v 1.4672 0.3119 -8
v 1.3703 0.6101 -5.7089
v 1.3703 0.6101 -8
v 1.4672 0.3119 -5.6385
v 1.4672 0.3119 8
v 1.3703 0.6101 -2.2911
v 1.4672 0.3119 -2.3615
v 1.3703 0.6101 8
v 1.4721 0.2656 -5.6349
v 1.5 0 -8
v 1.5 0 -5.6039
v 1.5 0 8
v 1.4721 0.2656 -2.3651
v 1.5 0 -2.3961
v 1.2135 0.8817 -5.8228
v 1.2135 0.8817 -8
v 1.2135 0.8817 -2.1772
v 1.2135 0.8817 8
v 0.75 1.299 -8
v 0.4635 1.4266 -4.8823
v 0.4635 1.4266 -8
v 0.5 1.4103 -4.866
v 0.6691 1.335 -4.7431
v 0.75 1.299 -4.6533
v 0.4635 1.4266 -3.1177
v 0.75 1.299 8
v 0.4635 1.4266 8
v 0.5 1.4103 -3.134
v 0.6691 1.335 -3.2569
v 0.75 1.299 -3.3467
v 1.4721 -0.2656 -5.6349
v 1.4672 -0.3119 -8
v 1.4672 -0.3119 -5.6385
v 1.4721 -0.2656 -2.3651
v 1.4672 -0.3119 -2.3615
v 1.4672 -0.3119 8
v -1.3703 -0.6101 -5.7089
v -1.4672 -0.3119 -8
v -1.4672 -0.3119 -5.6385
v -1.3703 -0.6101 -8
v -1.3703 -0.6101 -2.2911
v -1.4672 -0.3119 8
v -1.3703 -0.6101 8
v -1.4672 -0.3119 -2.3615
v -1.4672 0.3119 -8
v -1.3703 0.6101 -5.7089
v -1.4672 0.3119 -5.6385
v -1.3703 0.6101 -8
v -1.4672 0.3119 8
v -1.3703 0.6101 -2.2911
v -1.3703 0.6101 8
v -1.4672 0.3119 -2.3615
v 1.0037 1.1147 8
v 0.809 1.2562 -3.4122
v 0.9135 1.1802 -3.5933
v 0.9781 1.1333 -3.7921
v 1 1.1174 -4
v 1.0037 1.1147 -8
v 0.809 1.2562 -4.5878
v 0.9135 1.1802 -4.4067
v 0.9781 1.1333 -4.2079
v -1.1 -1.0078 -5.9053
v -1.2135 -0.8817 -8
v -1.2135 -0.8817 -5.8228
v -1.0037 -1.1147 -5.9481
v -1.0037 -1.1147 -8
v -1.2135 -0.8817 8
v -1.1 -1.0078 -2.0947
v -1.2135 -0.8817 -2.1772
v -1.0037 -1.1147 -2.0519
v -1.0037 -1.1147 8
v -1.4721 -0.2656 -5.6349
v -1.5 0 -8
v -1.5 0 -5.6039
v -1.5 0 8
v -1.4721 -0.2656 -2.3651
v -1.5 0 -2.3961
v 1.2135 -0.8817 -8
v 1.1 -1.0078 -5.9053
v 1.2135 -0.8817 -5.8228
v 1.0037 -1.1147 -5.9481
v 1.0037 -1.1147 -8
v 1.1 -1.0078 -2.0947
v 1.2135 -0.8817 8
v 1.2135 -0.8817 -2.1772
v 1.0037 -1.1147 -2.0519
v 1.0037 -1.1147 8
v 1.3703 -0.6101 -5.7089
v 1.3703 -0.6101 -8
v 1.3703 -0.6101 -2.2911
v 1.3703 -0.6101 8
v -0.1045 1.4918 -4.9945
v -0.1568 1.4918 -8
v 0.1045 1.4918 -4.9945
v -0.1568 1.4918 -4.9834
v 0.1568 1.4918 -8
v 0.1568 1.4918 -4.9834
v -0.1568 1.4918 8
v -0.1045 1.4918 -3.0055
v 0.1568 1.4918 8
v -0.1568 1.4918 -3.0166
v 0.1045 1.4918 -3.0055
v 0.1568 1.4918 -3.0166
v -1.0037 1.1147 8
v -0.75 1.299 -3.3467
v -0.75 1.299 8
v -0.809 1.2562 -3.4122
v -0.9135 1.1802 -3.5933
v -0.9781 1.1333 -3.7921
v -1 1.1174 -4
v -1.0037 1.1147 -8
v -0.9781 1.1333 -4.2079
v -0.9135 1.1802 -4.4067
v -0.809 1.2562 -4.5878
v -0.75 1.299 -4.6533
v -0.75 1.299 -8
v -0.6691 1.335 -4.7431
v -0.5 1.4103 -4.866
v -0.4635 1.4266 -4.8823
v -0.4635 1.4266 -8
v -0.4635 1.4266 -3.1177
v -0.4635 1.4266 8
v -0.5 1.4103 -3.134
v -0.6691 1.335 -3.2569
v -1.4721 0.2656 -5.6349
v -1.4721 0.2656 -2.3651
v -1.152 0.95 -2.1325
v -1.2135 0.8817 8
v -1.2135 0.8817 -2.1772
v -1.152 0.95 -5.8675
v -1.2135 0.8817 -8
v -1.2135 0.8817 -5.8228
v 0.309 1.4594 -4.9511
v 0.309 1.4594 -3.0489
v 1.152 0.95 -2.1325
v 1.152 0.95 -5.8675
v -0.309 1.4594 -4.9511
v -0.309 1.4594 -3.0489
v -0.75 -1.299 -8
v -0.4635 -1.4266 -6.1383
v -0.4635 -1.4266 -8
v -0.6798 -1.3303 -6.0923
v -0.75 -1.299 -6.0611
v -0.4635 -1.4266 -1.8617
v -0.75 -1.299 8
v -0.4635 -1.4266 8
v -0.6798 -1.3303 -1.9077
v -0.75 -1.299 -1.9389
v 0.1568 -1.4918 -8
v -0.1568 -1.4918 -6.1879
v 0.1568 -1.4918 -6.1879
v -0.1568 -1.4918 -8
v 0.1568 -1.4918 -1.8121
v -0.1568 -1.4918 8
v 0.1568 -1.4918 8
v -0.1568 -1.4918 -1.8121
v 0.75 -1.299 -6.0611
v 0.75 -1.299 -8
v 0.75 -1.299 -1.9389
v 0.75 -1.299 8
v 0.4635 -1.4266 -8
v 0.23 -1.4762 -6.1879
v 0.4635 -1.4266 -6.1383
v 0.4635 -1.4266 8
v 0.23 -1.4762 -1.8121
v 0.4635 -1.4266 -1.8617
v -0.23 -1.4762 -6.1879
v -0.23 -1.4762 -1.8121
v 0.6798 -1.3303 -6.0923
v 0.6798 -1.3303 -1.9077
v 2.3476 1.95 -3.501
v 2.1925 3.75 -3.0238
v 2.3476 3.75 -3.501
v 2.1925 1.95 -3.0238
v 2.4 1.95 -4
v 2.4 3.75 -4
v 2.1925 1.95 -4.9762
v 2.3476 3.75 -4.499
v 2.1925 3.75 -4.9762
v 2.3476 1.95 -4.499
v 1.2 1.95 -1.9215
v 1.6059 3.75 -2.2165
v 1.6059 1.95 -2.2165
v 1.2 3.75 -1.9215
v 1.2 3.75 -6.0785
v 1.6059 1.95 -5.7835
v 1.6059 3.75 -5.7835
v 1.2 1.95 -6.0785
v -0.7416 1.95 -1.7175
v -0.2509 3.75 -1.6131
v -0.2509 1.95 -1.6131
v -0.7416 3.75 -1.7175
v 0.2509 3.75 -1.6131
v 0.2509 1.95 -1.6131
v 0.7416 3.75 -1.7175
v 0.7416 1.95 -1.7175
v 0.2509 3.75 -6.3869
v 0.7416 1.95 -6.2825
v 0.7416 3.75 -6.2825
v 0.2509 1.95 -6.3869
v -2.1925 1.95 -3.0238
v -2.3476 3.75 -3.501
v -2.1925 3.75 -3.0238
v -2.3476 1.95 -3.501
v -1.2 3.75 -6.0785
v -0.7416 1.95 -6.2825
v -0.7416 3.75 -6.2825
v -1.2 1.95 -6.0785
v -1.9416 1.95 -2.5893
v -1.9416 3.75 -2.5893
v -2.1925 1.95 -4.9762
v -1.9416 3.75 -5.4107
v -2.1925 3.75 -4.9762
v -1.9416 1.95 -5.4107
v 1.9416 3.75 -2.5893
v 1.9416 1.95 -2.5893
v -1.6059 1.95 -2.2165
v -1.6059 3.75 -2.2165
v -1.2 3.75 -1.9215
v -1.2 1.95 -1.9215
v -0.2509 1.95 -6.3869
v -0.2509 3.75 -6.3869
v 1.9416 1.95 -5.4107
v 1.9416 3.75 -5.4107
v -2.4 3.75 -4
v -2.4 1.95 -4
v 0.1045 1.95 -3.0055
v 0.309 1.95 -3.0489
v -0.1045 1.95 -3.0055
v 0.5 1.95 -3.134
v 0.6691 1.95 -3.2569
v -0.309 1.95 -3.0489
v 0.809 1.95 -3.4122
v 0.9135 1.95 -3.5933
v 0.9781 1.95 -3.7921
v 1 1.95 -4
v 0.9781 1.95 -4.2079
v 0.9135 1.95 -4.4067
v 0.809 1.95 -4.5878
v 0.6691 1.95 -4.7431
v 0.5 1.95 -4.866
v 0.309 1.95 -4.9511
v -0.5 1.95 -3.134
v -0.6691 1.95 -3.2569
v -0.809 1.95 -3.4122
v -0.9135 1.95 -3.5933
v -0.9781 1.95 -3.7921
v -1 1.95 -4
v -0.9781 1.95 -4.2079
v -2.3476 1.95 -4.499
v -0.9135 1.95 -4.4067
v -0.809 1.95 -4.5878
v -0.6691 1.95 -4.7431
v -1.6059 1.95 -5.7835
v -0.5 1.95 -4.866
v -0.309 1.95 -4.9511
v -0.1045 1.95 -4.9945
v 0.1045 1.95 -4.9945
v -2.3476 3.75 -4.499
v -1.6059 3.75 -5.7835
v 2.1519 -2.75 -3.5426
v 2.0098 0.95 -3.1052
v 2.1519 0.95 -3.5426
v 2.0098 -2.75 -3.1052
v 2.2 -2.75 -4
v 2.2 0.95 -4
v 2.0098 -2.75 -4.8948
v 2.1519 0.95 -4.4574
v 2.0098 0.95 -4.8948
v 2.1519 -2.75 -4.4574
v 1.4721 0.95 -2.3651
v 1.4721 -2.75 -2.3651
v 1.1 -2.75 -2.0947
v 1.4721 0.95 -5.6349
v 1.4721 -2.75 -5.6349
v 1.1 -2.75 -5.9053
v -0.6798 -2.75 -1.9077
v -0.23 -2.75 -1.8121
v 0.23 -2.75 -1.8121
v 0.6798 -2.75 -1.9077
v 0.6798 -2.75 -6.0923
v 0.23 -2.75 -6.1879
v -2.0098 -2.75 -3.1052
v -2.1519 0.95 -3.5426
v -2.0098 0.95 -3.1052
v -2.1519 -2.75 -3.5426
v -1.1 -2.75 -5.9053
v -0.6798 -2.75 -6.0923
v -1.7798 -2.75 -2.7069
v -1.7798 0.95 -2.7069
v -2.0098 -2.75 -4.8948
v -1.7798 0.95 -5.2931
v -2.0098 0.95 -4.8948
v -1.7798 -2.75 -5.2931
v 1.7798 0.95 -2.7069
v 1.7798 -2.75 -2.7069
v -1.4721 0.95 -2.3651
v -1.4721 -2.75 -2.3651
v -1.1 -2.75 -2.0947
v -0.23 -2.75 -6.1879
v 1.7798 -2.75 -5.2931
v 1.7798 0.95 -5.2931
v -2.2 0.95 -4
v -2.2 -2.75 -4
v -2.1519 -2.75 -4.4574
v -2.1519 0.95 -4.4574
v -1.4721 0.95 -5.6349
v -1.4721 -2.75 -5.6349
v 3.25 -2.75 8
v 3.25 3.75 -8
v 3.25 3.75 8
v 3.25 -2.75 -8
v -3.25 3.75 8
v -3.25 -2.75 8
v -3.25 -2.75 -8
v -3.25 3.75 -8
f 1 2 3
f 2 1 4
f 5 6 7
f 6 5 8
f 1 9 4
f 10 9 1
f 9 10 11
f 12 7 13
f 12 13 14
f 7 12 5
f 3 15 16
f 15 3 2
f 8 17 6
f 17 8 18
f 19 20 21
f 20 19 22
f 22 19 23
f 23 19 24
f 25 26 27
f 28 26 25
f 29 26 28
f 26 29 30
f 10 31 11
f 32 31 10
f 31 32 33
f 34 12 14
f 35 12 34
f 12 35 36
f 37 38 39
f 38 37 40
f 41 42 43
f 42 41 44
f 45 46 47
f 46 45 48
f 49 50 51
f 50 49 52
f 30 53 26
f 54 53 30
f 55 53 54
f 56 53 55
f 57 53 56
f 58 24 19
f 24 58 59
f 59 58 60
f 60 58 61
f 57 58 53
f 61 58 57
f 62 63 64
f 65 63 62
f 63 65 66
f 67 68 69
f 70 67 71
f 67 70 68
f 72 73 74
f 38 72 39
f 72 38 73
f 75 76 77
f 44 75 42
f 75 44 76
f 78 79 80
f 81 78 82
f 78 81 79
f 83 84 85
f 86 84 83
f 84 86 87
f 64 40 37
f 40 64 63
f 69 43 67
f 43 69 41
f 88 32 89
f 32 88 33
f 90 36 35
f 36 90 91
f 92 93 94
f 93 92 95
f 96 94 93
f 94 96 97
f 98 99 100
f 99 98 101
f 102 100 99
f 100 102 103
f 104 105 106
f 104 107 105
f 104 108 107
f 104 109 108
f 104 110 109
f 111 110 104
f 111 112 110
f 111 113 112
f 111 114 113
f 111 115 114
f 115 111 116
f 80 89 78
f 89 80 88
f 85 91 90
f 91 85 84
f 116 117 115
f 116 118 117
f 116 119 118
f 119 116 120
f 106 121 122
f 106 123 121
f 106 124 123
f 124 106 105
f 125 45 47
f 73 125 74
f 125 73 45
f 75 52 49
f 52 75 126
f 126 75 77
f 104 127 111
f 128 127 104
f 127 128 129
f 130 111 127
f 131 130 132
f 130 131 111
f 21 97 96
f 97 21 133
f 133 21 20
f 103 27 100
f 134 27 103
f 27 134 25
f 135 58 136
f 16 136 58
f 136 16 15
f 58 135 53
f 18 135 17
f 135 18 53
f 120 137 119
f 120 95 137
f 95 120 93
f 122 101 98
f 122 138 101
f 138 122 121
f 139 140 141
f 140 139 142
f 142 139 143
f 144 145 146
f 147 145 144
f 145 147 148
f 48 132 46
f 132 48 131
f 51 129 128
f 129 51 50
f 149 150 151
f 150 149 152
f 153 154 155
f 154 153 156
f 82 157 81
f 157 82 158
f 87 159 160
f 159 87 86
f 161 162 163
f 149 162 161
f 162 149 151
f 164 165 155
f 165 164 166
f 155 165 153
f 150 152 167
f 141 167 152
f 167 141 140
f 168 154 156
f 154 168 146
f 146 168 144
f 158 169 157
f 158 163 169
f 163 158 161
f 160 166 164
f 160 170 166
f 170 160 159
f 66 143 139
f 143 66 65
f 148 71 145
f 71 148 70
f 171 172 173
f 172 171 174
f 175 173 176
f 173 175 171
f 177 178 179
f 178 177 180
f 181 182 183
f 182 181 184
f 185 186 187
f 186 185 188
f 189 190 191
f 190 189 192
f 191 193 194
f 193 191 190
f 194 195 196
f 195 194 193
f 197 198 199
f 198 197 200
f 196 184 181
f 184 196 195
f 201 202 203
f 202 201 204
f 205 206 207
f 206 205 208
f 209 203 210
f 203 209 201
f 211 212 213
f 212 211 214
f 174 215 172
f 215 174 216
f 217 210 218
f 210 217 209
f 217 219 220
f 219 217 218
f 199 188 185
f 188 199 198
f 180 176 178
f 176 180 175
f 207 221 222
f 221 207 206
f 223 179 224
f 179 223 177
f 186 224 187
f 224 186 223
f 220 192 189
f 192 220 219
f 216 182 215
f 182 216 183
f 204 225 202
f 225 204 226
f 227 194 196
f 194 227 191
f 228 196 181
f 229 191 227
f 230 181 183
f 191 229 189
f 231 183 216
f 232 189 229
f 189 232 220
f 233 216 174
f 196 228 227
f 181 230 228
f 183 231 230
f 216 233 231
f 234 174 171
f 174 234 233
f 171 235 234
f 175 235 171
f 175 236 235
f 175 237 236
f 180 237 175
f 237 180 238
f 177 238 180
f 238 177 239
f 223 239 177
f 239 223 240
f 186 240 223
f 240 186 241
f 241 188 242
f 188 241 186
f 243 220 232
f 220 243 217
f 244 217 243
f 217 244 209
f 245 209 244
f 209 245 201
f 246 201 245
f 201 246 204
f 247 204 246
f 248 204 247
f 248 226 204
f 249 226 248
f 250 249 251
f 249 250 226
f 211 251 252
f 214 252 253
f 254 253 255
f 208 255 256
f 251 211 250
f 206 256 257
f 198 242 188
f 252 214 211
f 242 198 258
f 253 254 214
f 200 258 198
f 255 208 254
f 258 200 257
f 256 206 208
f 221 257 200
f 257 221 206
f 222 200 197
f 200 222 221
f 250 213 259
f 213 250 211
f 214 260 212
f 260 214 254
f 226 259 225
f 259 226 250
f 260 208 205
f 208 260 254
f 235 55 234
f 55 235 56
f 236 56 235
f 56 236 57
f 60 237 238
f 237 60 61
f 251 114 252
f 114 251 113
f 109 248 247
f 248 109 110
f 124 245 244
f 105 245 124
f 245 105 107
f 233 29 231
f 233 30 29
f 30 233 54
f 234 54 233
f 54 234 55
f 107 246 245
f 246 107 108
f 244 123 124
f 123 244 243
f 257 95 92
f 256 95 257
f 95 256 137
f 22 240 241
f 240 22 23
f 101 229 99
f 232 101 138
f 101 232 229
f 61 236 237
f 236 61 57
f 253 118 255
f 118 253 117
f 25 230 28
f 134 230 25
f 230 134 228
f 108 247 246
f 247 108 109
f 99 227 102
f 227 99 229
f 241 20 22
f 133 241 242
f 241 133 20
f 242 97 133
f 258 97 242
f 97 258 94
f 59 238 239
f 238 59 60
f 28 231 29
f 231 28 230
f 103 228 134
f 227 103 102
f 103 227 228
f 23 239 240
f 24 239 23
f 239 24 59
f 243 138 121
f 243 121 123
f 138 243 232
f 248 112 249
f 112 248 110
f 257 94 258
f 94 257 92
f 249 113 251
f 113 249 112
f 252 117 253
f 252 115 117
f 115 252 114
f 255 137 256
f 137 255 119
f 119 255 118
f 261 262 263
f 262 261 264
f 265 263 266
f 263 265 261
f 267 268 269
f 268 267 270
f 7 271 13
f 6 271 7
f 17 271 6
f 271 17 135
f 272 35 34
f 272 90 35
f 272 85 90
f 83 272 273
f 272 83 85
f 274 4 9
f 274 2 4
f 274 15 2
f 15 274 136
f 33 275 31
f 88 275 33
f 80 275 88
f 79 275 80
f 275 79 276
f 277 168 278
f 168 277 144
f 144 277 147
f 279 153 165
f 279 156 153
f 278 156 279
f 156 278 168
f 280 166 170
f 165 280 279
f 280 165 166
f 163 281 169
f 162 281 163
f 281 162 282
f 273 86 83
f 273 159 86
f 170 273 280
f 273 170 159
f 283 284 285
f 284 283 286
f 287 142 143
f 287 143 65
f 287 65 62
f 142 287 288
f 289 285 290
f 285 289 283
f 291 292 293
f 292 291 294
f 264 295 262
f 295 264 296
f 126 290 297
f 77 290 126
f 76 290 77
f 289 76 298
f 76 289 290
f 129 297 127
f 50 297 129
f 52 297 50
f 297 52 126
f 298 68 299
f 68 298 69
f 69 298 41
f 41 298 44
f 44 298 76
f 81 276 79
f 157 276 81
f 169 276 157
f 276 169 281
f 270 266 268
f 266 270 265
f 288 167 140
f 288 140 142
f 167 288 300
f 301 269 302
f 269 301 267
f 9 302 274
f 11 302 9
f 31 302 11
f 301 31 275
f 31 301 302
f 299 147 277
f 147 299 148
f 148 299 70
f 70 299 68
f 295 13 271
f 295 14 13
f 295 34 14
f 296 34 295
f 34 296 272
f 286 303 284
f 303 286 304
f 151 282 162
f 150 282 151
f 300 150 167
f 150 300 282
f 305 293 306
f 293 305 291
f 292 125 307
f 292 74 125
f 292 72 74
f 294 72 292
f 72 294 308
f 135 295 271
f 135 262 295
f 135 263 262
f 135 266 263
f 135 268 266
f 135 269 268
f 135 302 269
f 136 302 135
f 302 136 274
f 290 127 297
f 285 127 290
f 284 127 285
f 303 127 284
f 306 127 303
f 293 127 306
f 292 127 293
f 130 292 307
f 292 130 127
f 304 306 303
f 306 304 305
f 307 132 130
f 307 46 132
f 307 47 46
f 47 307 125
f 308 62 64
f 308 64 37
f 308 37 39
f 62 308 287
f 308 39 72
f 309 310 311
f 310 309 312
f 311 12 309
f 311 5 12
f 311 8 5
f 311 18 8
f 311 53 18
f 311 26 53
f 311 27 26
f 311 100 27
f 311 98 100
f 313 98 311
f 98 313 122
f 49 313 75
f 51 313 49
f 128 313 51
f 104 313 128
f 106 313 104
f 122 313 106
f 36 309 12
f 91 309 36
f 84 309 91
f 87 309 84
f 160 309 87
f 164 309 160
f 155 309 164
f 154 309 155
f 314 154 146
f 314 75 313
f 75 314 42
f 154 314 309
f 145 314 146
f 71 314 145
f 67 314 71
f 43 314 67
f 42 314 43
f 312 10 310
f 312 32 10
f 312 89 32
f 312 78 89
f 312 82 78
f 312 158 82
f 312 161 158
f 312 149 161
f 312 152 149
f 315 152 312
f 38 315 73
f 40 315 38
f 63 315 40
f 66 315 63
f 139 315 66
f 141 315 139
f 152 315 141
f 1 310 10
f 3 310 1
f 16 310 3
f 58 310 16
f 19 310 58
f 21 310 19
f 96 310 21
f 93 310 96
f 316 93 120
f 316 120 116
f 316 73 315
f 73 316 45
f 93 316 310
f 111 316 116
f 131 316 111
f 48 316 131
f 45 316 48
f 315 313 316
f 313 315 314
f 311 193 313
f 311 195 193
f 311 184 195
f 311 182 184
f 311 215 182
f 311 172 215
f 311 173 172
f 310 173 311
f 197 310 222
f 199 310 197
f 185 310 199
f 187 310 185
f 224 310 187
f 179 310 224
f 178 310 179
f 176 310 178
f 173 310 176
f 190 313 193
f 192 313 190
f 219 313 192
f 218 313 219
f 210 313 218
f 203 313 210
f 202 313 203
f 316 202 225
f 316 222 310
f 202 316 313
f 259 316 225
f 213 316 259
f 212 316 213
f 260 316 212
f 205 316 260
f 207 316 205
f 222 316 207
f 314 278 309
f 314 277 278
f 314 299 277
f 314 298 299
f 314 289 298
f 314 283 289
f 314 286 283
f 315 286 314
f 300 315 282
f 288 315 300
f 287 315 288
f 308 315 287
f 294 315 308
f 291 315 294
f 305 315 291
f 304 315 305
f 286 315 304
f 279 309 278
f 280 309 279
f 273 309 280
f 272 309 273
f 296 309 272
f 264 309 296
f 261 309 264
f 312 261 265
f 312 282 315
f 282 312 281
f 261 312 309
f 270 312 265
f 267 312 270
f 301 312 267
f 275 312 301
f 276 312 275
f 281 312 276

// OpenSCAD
module connector()
{
difference()
{
   translate([0,0.5,0])  cube([6.5,6.5,16], center=true);
   //cylinder(r=3,h=20, center=true, $fn=30);
    # union() 
    {
      translate([0,0,0]) cylinder(r=1.5,h=20, center=true, $fn=30, center=true);
      translate([0,3,-4]) rotate([90,0,0]) cylinder(r=2.4,h=2.1, $fn=30, center=true); // hole for servo
      translate([0,0,-4]) rotate([90,0,0]) cylinder(r=1,h=12.1, $fn=30, center=true);
      translate([0,-1.6,-4]) rotate([90,0,0]) cylinder(r=2.2,h=5.1, $fn=30, center=true);
    }
  }
}

// translate([0,2,-5]) rotate([90,0,0]) cylinder(r=1,h=1, $fn=30, center=true);

single = 1;

if ( single == 0 )
for ( x = [0 : 3] )
  for ( y = [0 : 3] )
    for ( z = [0 : 0] )
    translate([7*x, 7*y, 20.1*z])  connector();

if ( single == 1 )
 connector();
